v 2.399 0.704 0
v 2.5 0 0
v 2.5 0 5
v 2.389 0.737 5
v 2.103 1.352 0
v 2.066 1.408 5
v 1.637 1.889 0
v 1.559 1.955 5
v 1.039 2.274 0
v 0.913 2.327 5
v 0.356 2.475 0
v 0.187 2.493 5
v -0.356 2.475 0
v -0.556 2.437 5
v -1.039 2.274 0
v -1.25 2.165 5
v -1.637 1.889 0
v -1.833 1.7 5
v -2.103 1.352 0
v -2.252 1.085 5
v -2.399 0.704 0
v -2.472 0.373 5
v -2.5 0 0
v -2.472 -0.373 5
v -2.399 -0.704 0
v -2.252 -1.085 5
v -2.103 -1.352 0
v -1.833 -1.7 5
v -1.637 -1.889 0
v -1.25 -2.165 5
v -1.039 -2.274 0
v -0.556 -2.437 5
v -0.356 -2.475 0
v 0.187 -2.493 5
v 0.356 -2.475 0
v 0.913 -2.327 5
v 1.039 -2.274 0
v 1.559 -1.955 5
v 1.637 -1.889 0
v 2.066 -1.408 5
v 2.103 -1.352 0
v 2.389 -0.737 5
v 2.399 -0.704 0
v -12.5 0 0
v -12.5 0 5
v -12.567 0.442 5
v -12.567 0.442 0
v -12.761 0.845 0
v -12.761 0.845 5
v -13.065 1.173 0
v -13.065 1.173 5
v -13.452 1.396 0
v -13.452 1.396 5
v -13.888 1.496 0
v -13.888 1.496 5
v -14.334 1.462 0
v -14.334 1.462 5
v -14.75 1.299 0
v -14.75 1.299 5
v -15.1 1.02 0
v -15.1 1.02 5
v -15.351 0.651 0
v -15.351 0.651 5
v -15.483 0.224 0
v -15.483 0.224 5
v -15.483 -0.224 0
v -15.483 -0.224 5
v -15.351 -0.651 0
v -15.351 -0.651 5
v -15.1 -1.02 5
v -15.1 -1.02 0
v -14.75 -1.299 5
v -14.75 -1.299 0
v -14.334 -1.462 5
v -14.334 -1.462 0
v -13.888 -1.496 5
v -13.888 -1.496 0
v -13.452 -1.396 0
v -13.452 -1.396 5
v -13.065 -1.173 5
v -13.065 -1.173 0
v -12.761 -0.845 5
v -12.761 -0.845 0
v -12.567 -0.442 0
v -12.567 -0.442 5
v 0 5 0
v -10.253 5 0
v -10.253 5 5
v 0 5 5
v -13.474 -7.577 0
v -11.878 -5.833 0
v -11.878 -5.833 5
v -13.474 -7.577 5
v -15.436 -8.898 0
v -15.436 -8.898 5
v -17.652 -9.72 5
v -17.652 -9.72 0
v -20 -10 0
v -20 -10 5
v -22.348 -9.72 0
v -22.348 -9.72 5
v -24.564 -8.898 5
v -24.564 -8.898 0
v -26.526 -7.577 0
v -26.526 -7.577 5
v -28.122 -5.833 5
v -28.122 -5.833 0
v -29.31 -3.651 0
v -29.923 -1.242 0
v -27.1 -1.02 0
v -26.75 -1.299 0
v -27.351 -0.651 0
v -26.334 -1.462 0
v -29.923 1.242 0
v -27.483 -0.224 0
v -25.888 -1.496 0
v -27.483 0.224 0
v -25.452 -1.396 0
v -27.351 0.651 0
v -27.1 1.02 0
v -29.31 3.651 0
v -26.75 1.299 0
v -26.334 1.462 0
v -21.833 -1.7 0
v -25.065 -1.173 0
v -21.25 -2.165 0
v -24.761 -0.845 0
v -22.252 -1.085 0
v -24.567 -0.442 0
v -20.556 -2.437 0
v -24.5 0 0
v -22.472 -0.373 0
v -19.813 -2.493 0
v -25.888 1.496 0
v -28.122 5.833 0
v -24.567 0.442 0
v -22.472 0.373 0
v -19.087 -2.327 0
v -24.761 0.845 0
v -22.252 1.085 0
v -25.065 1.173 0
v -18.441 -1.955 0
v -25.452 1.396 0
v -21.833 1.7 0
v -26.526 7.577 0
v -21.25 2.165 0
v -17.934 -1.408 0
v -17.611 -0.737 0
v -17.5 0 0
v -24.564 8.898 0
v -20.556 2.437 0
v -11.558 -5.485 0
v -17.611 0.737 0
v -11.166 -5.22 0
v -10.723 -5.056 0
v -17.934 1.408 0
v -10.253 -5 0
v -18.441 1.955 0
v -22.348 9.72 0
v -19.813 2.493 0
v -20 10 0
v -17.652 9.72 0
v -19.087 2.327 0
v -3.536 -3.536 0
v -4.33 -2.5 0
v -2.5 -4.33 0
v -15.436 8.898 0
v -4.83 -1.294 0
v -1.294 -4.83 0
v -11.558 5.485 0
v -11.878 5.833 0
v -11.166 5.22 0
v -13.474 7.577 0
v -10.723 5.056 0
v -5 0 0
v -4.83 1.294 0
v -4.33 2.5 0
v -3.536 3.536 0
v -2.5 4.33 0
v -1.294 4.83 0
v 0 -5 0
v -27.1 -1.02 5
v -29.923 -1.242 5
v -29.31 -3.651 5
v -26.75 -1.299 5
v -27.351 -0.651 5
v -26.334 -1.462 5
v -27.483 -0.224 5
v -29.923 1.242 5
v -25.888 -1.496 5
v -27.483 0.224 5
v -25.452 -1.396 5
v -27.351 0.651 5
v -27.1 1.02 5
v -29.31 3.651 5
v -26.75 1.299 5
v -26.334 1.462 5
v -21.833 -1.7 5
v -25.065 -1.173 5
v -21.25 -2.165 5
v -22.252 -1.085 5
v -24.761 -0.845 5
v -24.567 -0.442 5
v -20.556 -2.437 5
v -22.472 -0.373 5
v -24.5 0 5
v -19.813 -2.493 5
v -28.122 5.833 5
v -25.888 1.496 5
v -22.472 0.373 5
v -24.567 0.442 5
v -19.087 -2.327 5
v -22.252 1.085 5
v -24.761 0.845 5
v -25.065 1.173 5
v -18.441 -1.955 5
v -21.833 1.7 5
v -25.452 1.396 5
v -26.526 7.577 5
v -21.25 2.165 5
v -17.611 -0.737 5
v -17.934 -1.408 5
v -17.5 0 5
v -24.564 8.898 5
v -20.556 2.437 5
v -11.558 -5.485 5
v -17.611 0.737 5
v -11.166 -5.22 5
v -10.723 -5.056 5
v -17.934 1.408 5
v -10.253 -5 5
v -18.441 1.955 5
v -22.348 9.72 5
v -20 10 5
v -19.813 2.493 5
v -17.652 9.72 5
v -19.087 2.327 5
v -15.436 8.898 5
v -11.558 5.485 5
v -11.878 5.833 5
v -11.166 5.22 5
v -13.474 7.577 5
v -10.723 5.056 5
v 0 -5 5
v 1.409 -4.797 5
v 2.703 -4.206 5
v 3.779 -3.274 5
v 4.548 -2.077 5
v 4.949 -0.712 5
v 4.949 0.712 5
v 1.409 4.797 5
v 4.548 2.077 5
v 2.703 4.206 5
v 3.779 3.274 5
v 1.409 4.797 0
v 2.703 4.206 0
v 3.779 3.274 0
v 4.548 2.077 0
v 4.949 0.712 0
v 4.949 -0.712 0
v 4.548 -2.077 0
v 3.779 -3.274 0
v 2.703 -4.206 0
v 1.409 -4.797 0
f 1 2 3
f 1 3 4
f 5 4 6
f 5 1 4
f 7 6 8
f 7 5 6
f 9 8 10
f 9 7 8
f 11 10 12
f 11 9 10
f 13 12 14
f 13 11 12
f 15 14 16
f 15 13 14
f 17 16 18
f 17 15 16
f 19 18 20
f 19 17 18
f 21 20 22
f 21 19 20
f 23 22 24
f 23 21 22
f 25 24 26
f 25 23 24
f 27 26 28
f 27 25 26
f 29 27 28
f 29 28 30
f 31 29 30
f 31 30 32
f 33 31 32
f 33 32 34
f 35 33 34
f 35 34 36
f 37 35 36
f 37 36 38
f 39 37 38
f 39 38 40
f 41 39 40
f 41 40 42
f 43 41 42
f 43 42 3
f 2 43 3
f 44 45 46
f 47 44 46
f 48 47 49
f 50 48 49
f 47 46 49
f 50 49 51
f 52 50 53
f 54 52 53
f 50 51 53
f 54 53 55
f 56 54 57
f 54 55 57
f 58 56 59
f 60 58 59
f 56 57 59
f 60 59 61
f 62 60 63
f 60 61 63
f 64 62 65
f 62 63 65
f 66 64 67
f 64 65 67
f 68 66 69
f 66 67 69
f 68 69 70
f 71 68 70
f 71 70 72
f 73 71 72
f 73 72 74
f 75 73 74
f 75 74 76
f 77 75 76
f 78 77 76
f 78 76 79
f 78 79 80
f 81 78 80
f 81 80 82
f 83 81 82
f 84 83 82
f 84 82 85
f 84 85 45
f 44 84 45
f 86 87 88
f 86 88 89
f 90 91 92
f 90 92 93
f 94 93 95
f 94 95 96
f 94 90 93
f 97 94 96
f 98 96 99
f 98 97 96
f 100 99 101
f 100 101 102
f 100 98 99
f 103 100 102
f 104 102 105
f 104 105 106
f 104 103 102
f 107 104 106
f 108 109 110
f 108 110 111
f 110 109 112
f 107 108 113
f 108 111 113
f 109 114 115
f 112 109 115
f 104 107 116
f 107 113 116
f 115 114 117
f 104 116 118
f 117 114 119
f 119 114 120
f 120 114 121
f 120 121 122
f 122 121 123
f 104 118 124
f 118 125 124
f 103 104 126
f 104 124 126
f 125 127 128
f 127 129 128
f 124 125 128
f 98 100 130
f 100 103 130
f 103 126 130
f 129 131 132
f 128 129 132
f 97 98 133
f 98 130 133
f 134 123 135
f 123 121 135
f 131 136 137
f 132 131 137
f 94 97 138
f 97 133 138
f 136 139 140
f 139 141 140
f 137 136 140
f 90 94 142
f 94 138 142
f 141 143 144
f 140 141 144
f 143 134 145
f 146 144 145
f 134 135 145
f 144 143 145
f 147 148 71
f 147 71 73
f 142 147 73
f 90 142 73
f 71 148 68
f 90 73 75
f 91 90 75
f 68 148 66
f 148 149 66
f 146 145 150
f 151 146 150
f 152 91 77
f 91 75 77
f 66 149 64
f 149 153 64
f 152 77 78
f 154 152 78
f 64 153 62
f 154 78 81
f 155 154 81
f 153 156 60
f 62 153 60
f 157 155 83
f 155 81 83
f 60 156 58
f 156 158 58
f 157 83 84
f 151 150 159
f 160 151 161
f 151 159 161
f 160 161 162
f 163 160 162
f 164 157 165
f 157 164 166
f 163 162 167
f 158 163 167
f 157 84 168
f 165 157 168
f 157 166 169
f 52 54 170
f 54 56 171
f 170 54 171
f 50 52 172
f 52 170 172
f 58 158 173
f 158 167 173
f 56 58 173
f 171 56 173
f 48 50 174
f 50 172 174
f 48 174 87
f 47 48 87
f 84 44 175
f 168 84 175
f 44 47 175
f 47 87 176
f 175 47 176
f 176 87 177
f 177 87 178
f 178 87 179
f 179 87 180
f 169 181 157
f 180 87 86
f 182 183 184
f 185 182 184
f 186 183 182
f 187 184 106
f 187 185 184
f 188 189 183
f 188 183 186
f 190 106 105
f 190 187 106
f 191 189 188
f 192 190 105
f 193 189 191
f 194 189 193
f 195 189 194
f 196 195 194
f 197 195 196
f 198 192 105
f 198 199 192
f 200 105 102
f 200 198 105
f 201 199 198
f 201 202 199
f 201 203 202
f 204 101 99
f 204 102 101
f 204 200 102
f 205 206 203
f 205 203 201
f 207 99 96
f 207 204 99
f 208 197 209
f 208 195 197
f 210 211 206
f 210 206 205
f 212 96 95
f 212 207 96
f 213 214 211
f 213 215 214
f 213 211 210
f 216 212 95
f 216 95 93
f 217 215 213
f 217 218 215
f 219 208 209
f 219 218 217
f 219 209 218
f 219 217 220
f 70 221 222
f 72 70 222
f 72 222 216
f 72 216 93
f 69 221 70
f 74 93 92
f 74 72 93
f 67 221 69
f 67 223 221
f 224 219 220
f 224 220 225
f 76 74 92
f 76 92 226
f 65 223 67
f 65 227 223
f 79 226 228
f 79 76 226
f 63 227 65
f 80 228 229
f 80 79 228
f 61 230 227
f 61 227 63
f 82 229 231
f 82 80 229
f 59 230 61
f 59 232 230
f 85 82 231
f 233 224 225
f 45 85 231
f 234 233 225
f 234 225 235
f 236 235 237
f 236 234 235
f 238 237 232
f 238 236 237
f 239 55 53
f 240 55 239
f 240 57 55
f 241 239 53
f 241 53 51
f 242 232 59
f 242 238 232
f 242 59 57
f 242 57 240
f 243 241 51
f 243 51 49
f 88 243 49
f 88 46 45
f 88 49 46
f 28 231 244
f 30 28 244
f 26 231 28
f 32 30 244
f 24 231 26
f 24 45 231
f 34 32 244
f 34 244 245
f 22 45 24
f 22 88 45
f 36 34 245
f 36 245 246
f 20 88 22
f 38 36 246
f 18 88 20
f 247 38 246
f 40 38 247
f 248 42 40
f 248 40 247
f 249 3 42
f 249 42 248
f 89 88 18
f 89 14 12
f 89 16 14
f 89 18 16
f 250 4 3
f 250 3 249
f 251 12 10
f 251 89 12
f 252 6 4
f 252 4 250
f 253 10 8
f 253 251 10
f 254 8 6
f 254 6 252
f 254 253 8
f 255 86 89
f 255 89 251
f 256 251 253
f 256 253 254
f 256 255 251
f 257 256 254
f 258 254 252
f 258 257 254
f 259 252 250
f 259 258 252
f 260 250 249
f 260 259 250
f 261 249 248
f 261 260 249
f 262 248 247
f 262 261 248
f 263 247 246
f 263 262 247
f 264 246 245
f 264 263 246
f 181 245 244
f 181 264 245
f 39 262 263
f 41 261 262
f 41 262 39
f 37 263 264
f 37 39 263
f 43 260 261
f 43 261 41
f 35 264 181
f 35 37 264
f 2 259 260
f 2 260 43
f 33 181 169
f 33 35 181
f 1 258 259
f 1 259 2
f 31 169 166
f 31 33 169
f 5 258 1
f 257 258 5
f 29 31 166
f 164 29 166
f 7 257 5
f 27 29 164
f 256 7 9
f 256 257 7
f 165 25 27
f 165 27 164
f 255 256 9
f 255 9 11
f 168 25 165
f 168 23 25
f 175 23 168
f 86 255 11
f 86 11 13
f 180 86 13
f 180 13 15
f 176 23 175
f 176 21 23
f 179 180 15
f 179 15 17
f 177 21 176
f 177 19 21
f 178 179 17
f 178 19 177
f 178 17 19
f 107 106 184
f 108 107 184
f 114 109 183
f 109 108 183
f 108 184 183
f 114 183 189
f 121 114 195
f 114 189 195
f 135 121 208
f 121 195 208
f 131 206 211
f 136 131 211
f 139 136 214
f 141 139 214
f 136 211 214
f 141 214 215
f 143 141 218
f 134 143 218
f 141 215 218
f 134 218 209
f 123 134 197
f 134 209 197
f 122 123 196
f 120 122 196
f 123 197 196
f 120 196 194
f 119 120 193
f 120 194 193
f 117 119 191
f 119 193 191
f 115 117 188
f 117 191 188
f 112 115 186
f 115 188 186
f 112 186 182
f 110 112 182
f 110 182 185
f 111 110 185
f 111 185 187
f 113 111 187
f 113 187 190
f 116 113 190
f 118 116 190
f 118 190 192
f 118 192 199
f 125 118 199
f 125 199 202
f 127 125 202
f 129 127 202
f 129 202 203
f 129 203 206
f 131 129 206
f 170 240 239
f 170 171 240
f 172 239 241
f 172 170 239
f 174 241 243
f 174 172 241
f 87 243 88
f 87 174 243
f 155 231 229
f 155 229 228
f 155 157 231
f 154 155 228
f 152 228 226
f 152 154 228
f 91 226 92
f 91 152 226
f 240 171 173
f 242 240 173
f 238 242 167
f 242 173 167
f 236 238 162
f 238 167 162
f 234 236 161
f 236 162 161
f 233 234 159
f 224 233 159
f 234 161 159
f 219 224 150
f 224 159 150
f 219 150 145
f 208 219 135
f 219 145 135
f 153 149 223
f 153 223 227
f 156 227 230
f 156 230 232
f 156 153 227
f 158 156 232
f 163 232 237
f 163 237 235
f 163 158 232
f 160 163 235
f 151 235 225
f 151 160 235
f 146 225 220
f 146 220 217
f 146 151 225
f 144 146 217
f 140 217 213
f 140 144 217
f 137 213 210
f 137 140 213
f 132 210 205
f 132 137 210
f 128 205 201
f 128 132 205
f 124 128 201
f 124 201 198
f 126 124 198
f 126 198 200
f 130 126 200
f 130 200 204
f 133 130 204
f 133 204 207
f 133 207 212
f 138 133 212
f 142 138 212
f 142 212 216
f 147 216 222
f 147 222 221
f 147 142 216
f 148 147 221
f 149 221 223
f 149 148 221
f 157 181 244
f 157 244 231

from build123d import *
from build123d.topology import SkipClean

# Parameters (mm, degrees)
SKETCH_1_R               = 2.4999999999999982
SKETCH_1_R_2             = 2.4999999999999947
SKETCH_1_R_3             = 2.5
EXTRUDE_1_DEPTH          = 5
EXTRUDE_START            = 12.8
SKETCH_2_R               = 5.000000000000004
SKETCH_2_R_2             = 2.4999999999999947
SKETCH_2_R_3             = 5
SKETCH_2_R_4             = 2.5
EXTRUDE_2_DEPTH          = 12.8
SKETCH_3_R               = 1.5000000000000007
CUT_EXTRUDE_1_DEPTH      = 13
EXTRUDE_START_2          = -5
EXTRUDE_3_DEPTH          = 5
FILLET_1_R               = 2
CUT_EXTRUDE_2_DEPTH      = 16
CUT_EXTRUDE_2_DEPTH_BACK = 10
CUT_EXTRUDE_START        = 14.000000000000002
SKETCH_7_R               = 5
CUT_EXTRUDE_3_DEPTH      = 14.000000000000002


with BuildPart() as part:
    # 草图1 → 凸台-拉伸1 (new body)
    with BuildSketch(Plane.XY):
        with BuildLine():
            Line((6.1e-16, -5), (-40, -5.000000000000006))
            ThreePointArc((-40, -5.000000000000006), (-45, -4.29e-15), (-40, 4.999999999999996))
            Line((-40, 4.999999999999996), (-6.1e-16, 5))
            ThreePointArc((-6.1e-16, 5), (5, 0), (6.1e-16, -5))
        make_face()
        with Locations((-20, -2.45e-15)):
            Circle(SKETCH_1_R, mode=Mode.SUBTRACT)
        with Locations((-40, -4.9e-15)):
            Circle(SKETCH_1_R_2, mode=Mode.SUBTRACT)
        Circle(SKETCH_1_R_3, mode=Mode.SUBTRACT)
    extrude(amount=EXTRUDE_1_DEPTH)

    # 草图2 → 凸台-拉伸2 (add)
    # profile 1 of 2: a face of its own
    with SkipClean():  # the faces are left unmerged after this step: merging them gives an invalid solid
        with BuildSketch(Plane(origin=(0, 0, 0), x_dir=(-1, 0, 0), z_dir=(0, 0, -1)).offset(EXTRUDE_START)):
            with Locations((40, -4.9e-15)):
                Circle(SKETCH_2_R)
            with Locations((40, -4.9e-15)):
                Circle(SKETCH_2_R_2, mode=Mode.SUBTRACT)
        # profile 2 of 2: a face of its own
        with BuildSketch(Plane(origin=(0, 0, 0), x_dir=(-1, 0, 0), z_dir=(0, 0, -1)).offset(EXTRUDE_START)):
            Circle(SKETCH_2_R_3)
            Circle(SKETCH_2_R_4, mode=Mode.SUBTRACT)
        extrude(amount=-EXTRUDE_2_DEPTH)

    # 草图3 → 切除-拉伸1 (cut)
    with SkipClean():  # the faces are left unmerged after this step: merging them gives an invalid solid
        with BuildSketch(Plane.XY.offset(5)):
            with Locations((-26.000000000000004, -2.45e-15)):
                Circle(SKETCH_3_R)
            with Locations((-13.999999999999998, -2.4e-16)):
                Circle(SKETCH_3_R)
        extrude(amount=-CUT_EXTRUDE_1_DEPTH, mode=Mode.SUBTRACT)

    # 草图4 → 凸台-拉伸3 (add)
    with SkipClean():  # the faces are left unmerged after this step: merging them gives an invalid solid
        with BuildSketch(Plane.XY.offset(5).offset(EXTRUDE_START_2)):
            with BuildLine():
                Line((-29.484888992731253, 3.168103659220378), (-10.515111007268752, 3.168103659220378))
                ThreePointArc((-10.515111007268752, 3.168103659220378), (-20, 9.999999999999996), (-29.484888992731253, 3.168103659220378))
            make_face()
            with BuildLine():
                Line((-29.548830353481478, -2.969821354969149), (-10.451169646518524, -2.969821354969149))
                ThreePointArc((-10.451169646518524, -2.969821354969149), (-20, -10), (-29.548830353481478, -2.969821354969149))
            make_face()
        extrude(amount=EXTRUDE_3_DEPTH)

    # 圆角1
    fillet_1_edges = [part.edges().sort_by_distance(p)[0] for p in [
        (-11.339745962155616, -5.000000000000002, 2.5),
        (-28.660254037844382, -5.000000000000005, 2.5),
        (-28.660254037844386, 4.999999999999997, 2.5),
        (-11.339745962155614, 4.999999999999999, 2.5),
    ]]
    fillet(fillet_1_edges, radius=FILLET_1_R)

    # 草图6 → 切除-拉伸2 (cut, two sides: drawn at the far end of the back side and taken through both)
    with SkipClean():  # the faces are left unmerged after this step: merging them gives an invalid solid
        with BuildSketch(Plane(origin=(0, 0, 0), x_dir=(-1, 0, 0), z_dir=(0, 0, -1)).offset(-CUT_EXTRUDE_2_DEPTH_BACK)):
            with BuildLine():
                Line((28.122328620674136, 5.83333333333333), (47.018648457175516, 5.83333333333333))
                Line((47.018648457175516, 5.83333333333333), (47.018648457175516, -5.833333333333338))
                Line((47.018648457175516, -5.833333333333338), (28.122328620674132, -5.833333333333338))
                ThreePointArc((28.122328620674132, -5.833333333333338), (30, -4.67e-15), (28.122328620674136, 5.83333333333333))
            make_face()
        extrude(amount=CUT_EXTRUDE_2_DEPTH + CUT_EXTRUDE_2_DEPTH_BACK, mode=Mode.SUBTRACT)

    # 草图7 → 切除-拉伸3 (cut)
    with SkipClean():  # the faces are left unmerged after this step: merging them gives an invalid solid
        with BuildSketch(Plane(origin=(0, 0, 0), x_dir=(-1, 0, 0), z_dir=(0, 0, -1)).offset(CUT_EXTRUDE_START)):
            Circle(SKETCH_7_R)
        extrude(amount=-CUT_EXTRUDE_3_DEPTH, mode=Mode.SUBTRACT)


solid = part.part
